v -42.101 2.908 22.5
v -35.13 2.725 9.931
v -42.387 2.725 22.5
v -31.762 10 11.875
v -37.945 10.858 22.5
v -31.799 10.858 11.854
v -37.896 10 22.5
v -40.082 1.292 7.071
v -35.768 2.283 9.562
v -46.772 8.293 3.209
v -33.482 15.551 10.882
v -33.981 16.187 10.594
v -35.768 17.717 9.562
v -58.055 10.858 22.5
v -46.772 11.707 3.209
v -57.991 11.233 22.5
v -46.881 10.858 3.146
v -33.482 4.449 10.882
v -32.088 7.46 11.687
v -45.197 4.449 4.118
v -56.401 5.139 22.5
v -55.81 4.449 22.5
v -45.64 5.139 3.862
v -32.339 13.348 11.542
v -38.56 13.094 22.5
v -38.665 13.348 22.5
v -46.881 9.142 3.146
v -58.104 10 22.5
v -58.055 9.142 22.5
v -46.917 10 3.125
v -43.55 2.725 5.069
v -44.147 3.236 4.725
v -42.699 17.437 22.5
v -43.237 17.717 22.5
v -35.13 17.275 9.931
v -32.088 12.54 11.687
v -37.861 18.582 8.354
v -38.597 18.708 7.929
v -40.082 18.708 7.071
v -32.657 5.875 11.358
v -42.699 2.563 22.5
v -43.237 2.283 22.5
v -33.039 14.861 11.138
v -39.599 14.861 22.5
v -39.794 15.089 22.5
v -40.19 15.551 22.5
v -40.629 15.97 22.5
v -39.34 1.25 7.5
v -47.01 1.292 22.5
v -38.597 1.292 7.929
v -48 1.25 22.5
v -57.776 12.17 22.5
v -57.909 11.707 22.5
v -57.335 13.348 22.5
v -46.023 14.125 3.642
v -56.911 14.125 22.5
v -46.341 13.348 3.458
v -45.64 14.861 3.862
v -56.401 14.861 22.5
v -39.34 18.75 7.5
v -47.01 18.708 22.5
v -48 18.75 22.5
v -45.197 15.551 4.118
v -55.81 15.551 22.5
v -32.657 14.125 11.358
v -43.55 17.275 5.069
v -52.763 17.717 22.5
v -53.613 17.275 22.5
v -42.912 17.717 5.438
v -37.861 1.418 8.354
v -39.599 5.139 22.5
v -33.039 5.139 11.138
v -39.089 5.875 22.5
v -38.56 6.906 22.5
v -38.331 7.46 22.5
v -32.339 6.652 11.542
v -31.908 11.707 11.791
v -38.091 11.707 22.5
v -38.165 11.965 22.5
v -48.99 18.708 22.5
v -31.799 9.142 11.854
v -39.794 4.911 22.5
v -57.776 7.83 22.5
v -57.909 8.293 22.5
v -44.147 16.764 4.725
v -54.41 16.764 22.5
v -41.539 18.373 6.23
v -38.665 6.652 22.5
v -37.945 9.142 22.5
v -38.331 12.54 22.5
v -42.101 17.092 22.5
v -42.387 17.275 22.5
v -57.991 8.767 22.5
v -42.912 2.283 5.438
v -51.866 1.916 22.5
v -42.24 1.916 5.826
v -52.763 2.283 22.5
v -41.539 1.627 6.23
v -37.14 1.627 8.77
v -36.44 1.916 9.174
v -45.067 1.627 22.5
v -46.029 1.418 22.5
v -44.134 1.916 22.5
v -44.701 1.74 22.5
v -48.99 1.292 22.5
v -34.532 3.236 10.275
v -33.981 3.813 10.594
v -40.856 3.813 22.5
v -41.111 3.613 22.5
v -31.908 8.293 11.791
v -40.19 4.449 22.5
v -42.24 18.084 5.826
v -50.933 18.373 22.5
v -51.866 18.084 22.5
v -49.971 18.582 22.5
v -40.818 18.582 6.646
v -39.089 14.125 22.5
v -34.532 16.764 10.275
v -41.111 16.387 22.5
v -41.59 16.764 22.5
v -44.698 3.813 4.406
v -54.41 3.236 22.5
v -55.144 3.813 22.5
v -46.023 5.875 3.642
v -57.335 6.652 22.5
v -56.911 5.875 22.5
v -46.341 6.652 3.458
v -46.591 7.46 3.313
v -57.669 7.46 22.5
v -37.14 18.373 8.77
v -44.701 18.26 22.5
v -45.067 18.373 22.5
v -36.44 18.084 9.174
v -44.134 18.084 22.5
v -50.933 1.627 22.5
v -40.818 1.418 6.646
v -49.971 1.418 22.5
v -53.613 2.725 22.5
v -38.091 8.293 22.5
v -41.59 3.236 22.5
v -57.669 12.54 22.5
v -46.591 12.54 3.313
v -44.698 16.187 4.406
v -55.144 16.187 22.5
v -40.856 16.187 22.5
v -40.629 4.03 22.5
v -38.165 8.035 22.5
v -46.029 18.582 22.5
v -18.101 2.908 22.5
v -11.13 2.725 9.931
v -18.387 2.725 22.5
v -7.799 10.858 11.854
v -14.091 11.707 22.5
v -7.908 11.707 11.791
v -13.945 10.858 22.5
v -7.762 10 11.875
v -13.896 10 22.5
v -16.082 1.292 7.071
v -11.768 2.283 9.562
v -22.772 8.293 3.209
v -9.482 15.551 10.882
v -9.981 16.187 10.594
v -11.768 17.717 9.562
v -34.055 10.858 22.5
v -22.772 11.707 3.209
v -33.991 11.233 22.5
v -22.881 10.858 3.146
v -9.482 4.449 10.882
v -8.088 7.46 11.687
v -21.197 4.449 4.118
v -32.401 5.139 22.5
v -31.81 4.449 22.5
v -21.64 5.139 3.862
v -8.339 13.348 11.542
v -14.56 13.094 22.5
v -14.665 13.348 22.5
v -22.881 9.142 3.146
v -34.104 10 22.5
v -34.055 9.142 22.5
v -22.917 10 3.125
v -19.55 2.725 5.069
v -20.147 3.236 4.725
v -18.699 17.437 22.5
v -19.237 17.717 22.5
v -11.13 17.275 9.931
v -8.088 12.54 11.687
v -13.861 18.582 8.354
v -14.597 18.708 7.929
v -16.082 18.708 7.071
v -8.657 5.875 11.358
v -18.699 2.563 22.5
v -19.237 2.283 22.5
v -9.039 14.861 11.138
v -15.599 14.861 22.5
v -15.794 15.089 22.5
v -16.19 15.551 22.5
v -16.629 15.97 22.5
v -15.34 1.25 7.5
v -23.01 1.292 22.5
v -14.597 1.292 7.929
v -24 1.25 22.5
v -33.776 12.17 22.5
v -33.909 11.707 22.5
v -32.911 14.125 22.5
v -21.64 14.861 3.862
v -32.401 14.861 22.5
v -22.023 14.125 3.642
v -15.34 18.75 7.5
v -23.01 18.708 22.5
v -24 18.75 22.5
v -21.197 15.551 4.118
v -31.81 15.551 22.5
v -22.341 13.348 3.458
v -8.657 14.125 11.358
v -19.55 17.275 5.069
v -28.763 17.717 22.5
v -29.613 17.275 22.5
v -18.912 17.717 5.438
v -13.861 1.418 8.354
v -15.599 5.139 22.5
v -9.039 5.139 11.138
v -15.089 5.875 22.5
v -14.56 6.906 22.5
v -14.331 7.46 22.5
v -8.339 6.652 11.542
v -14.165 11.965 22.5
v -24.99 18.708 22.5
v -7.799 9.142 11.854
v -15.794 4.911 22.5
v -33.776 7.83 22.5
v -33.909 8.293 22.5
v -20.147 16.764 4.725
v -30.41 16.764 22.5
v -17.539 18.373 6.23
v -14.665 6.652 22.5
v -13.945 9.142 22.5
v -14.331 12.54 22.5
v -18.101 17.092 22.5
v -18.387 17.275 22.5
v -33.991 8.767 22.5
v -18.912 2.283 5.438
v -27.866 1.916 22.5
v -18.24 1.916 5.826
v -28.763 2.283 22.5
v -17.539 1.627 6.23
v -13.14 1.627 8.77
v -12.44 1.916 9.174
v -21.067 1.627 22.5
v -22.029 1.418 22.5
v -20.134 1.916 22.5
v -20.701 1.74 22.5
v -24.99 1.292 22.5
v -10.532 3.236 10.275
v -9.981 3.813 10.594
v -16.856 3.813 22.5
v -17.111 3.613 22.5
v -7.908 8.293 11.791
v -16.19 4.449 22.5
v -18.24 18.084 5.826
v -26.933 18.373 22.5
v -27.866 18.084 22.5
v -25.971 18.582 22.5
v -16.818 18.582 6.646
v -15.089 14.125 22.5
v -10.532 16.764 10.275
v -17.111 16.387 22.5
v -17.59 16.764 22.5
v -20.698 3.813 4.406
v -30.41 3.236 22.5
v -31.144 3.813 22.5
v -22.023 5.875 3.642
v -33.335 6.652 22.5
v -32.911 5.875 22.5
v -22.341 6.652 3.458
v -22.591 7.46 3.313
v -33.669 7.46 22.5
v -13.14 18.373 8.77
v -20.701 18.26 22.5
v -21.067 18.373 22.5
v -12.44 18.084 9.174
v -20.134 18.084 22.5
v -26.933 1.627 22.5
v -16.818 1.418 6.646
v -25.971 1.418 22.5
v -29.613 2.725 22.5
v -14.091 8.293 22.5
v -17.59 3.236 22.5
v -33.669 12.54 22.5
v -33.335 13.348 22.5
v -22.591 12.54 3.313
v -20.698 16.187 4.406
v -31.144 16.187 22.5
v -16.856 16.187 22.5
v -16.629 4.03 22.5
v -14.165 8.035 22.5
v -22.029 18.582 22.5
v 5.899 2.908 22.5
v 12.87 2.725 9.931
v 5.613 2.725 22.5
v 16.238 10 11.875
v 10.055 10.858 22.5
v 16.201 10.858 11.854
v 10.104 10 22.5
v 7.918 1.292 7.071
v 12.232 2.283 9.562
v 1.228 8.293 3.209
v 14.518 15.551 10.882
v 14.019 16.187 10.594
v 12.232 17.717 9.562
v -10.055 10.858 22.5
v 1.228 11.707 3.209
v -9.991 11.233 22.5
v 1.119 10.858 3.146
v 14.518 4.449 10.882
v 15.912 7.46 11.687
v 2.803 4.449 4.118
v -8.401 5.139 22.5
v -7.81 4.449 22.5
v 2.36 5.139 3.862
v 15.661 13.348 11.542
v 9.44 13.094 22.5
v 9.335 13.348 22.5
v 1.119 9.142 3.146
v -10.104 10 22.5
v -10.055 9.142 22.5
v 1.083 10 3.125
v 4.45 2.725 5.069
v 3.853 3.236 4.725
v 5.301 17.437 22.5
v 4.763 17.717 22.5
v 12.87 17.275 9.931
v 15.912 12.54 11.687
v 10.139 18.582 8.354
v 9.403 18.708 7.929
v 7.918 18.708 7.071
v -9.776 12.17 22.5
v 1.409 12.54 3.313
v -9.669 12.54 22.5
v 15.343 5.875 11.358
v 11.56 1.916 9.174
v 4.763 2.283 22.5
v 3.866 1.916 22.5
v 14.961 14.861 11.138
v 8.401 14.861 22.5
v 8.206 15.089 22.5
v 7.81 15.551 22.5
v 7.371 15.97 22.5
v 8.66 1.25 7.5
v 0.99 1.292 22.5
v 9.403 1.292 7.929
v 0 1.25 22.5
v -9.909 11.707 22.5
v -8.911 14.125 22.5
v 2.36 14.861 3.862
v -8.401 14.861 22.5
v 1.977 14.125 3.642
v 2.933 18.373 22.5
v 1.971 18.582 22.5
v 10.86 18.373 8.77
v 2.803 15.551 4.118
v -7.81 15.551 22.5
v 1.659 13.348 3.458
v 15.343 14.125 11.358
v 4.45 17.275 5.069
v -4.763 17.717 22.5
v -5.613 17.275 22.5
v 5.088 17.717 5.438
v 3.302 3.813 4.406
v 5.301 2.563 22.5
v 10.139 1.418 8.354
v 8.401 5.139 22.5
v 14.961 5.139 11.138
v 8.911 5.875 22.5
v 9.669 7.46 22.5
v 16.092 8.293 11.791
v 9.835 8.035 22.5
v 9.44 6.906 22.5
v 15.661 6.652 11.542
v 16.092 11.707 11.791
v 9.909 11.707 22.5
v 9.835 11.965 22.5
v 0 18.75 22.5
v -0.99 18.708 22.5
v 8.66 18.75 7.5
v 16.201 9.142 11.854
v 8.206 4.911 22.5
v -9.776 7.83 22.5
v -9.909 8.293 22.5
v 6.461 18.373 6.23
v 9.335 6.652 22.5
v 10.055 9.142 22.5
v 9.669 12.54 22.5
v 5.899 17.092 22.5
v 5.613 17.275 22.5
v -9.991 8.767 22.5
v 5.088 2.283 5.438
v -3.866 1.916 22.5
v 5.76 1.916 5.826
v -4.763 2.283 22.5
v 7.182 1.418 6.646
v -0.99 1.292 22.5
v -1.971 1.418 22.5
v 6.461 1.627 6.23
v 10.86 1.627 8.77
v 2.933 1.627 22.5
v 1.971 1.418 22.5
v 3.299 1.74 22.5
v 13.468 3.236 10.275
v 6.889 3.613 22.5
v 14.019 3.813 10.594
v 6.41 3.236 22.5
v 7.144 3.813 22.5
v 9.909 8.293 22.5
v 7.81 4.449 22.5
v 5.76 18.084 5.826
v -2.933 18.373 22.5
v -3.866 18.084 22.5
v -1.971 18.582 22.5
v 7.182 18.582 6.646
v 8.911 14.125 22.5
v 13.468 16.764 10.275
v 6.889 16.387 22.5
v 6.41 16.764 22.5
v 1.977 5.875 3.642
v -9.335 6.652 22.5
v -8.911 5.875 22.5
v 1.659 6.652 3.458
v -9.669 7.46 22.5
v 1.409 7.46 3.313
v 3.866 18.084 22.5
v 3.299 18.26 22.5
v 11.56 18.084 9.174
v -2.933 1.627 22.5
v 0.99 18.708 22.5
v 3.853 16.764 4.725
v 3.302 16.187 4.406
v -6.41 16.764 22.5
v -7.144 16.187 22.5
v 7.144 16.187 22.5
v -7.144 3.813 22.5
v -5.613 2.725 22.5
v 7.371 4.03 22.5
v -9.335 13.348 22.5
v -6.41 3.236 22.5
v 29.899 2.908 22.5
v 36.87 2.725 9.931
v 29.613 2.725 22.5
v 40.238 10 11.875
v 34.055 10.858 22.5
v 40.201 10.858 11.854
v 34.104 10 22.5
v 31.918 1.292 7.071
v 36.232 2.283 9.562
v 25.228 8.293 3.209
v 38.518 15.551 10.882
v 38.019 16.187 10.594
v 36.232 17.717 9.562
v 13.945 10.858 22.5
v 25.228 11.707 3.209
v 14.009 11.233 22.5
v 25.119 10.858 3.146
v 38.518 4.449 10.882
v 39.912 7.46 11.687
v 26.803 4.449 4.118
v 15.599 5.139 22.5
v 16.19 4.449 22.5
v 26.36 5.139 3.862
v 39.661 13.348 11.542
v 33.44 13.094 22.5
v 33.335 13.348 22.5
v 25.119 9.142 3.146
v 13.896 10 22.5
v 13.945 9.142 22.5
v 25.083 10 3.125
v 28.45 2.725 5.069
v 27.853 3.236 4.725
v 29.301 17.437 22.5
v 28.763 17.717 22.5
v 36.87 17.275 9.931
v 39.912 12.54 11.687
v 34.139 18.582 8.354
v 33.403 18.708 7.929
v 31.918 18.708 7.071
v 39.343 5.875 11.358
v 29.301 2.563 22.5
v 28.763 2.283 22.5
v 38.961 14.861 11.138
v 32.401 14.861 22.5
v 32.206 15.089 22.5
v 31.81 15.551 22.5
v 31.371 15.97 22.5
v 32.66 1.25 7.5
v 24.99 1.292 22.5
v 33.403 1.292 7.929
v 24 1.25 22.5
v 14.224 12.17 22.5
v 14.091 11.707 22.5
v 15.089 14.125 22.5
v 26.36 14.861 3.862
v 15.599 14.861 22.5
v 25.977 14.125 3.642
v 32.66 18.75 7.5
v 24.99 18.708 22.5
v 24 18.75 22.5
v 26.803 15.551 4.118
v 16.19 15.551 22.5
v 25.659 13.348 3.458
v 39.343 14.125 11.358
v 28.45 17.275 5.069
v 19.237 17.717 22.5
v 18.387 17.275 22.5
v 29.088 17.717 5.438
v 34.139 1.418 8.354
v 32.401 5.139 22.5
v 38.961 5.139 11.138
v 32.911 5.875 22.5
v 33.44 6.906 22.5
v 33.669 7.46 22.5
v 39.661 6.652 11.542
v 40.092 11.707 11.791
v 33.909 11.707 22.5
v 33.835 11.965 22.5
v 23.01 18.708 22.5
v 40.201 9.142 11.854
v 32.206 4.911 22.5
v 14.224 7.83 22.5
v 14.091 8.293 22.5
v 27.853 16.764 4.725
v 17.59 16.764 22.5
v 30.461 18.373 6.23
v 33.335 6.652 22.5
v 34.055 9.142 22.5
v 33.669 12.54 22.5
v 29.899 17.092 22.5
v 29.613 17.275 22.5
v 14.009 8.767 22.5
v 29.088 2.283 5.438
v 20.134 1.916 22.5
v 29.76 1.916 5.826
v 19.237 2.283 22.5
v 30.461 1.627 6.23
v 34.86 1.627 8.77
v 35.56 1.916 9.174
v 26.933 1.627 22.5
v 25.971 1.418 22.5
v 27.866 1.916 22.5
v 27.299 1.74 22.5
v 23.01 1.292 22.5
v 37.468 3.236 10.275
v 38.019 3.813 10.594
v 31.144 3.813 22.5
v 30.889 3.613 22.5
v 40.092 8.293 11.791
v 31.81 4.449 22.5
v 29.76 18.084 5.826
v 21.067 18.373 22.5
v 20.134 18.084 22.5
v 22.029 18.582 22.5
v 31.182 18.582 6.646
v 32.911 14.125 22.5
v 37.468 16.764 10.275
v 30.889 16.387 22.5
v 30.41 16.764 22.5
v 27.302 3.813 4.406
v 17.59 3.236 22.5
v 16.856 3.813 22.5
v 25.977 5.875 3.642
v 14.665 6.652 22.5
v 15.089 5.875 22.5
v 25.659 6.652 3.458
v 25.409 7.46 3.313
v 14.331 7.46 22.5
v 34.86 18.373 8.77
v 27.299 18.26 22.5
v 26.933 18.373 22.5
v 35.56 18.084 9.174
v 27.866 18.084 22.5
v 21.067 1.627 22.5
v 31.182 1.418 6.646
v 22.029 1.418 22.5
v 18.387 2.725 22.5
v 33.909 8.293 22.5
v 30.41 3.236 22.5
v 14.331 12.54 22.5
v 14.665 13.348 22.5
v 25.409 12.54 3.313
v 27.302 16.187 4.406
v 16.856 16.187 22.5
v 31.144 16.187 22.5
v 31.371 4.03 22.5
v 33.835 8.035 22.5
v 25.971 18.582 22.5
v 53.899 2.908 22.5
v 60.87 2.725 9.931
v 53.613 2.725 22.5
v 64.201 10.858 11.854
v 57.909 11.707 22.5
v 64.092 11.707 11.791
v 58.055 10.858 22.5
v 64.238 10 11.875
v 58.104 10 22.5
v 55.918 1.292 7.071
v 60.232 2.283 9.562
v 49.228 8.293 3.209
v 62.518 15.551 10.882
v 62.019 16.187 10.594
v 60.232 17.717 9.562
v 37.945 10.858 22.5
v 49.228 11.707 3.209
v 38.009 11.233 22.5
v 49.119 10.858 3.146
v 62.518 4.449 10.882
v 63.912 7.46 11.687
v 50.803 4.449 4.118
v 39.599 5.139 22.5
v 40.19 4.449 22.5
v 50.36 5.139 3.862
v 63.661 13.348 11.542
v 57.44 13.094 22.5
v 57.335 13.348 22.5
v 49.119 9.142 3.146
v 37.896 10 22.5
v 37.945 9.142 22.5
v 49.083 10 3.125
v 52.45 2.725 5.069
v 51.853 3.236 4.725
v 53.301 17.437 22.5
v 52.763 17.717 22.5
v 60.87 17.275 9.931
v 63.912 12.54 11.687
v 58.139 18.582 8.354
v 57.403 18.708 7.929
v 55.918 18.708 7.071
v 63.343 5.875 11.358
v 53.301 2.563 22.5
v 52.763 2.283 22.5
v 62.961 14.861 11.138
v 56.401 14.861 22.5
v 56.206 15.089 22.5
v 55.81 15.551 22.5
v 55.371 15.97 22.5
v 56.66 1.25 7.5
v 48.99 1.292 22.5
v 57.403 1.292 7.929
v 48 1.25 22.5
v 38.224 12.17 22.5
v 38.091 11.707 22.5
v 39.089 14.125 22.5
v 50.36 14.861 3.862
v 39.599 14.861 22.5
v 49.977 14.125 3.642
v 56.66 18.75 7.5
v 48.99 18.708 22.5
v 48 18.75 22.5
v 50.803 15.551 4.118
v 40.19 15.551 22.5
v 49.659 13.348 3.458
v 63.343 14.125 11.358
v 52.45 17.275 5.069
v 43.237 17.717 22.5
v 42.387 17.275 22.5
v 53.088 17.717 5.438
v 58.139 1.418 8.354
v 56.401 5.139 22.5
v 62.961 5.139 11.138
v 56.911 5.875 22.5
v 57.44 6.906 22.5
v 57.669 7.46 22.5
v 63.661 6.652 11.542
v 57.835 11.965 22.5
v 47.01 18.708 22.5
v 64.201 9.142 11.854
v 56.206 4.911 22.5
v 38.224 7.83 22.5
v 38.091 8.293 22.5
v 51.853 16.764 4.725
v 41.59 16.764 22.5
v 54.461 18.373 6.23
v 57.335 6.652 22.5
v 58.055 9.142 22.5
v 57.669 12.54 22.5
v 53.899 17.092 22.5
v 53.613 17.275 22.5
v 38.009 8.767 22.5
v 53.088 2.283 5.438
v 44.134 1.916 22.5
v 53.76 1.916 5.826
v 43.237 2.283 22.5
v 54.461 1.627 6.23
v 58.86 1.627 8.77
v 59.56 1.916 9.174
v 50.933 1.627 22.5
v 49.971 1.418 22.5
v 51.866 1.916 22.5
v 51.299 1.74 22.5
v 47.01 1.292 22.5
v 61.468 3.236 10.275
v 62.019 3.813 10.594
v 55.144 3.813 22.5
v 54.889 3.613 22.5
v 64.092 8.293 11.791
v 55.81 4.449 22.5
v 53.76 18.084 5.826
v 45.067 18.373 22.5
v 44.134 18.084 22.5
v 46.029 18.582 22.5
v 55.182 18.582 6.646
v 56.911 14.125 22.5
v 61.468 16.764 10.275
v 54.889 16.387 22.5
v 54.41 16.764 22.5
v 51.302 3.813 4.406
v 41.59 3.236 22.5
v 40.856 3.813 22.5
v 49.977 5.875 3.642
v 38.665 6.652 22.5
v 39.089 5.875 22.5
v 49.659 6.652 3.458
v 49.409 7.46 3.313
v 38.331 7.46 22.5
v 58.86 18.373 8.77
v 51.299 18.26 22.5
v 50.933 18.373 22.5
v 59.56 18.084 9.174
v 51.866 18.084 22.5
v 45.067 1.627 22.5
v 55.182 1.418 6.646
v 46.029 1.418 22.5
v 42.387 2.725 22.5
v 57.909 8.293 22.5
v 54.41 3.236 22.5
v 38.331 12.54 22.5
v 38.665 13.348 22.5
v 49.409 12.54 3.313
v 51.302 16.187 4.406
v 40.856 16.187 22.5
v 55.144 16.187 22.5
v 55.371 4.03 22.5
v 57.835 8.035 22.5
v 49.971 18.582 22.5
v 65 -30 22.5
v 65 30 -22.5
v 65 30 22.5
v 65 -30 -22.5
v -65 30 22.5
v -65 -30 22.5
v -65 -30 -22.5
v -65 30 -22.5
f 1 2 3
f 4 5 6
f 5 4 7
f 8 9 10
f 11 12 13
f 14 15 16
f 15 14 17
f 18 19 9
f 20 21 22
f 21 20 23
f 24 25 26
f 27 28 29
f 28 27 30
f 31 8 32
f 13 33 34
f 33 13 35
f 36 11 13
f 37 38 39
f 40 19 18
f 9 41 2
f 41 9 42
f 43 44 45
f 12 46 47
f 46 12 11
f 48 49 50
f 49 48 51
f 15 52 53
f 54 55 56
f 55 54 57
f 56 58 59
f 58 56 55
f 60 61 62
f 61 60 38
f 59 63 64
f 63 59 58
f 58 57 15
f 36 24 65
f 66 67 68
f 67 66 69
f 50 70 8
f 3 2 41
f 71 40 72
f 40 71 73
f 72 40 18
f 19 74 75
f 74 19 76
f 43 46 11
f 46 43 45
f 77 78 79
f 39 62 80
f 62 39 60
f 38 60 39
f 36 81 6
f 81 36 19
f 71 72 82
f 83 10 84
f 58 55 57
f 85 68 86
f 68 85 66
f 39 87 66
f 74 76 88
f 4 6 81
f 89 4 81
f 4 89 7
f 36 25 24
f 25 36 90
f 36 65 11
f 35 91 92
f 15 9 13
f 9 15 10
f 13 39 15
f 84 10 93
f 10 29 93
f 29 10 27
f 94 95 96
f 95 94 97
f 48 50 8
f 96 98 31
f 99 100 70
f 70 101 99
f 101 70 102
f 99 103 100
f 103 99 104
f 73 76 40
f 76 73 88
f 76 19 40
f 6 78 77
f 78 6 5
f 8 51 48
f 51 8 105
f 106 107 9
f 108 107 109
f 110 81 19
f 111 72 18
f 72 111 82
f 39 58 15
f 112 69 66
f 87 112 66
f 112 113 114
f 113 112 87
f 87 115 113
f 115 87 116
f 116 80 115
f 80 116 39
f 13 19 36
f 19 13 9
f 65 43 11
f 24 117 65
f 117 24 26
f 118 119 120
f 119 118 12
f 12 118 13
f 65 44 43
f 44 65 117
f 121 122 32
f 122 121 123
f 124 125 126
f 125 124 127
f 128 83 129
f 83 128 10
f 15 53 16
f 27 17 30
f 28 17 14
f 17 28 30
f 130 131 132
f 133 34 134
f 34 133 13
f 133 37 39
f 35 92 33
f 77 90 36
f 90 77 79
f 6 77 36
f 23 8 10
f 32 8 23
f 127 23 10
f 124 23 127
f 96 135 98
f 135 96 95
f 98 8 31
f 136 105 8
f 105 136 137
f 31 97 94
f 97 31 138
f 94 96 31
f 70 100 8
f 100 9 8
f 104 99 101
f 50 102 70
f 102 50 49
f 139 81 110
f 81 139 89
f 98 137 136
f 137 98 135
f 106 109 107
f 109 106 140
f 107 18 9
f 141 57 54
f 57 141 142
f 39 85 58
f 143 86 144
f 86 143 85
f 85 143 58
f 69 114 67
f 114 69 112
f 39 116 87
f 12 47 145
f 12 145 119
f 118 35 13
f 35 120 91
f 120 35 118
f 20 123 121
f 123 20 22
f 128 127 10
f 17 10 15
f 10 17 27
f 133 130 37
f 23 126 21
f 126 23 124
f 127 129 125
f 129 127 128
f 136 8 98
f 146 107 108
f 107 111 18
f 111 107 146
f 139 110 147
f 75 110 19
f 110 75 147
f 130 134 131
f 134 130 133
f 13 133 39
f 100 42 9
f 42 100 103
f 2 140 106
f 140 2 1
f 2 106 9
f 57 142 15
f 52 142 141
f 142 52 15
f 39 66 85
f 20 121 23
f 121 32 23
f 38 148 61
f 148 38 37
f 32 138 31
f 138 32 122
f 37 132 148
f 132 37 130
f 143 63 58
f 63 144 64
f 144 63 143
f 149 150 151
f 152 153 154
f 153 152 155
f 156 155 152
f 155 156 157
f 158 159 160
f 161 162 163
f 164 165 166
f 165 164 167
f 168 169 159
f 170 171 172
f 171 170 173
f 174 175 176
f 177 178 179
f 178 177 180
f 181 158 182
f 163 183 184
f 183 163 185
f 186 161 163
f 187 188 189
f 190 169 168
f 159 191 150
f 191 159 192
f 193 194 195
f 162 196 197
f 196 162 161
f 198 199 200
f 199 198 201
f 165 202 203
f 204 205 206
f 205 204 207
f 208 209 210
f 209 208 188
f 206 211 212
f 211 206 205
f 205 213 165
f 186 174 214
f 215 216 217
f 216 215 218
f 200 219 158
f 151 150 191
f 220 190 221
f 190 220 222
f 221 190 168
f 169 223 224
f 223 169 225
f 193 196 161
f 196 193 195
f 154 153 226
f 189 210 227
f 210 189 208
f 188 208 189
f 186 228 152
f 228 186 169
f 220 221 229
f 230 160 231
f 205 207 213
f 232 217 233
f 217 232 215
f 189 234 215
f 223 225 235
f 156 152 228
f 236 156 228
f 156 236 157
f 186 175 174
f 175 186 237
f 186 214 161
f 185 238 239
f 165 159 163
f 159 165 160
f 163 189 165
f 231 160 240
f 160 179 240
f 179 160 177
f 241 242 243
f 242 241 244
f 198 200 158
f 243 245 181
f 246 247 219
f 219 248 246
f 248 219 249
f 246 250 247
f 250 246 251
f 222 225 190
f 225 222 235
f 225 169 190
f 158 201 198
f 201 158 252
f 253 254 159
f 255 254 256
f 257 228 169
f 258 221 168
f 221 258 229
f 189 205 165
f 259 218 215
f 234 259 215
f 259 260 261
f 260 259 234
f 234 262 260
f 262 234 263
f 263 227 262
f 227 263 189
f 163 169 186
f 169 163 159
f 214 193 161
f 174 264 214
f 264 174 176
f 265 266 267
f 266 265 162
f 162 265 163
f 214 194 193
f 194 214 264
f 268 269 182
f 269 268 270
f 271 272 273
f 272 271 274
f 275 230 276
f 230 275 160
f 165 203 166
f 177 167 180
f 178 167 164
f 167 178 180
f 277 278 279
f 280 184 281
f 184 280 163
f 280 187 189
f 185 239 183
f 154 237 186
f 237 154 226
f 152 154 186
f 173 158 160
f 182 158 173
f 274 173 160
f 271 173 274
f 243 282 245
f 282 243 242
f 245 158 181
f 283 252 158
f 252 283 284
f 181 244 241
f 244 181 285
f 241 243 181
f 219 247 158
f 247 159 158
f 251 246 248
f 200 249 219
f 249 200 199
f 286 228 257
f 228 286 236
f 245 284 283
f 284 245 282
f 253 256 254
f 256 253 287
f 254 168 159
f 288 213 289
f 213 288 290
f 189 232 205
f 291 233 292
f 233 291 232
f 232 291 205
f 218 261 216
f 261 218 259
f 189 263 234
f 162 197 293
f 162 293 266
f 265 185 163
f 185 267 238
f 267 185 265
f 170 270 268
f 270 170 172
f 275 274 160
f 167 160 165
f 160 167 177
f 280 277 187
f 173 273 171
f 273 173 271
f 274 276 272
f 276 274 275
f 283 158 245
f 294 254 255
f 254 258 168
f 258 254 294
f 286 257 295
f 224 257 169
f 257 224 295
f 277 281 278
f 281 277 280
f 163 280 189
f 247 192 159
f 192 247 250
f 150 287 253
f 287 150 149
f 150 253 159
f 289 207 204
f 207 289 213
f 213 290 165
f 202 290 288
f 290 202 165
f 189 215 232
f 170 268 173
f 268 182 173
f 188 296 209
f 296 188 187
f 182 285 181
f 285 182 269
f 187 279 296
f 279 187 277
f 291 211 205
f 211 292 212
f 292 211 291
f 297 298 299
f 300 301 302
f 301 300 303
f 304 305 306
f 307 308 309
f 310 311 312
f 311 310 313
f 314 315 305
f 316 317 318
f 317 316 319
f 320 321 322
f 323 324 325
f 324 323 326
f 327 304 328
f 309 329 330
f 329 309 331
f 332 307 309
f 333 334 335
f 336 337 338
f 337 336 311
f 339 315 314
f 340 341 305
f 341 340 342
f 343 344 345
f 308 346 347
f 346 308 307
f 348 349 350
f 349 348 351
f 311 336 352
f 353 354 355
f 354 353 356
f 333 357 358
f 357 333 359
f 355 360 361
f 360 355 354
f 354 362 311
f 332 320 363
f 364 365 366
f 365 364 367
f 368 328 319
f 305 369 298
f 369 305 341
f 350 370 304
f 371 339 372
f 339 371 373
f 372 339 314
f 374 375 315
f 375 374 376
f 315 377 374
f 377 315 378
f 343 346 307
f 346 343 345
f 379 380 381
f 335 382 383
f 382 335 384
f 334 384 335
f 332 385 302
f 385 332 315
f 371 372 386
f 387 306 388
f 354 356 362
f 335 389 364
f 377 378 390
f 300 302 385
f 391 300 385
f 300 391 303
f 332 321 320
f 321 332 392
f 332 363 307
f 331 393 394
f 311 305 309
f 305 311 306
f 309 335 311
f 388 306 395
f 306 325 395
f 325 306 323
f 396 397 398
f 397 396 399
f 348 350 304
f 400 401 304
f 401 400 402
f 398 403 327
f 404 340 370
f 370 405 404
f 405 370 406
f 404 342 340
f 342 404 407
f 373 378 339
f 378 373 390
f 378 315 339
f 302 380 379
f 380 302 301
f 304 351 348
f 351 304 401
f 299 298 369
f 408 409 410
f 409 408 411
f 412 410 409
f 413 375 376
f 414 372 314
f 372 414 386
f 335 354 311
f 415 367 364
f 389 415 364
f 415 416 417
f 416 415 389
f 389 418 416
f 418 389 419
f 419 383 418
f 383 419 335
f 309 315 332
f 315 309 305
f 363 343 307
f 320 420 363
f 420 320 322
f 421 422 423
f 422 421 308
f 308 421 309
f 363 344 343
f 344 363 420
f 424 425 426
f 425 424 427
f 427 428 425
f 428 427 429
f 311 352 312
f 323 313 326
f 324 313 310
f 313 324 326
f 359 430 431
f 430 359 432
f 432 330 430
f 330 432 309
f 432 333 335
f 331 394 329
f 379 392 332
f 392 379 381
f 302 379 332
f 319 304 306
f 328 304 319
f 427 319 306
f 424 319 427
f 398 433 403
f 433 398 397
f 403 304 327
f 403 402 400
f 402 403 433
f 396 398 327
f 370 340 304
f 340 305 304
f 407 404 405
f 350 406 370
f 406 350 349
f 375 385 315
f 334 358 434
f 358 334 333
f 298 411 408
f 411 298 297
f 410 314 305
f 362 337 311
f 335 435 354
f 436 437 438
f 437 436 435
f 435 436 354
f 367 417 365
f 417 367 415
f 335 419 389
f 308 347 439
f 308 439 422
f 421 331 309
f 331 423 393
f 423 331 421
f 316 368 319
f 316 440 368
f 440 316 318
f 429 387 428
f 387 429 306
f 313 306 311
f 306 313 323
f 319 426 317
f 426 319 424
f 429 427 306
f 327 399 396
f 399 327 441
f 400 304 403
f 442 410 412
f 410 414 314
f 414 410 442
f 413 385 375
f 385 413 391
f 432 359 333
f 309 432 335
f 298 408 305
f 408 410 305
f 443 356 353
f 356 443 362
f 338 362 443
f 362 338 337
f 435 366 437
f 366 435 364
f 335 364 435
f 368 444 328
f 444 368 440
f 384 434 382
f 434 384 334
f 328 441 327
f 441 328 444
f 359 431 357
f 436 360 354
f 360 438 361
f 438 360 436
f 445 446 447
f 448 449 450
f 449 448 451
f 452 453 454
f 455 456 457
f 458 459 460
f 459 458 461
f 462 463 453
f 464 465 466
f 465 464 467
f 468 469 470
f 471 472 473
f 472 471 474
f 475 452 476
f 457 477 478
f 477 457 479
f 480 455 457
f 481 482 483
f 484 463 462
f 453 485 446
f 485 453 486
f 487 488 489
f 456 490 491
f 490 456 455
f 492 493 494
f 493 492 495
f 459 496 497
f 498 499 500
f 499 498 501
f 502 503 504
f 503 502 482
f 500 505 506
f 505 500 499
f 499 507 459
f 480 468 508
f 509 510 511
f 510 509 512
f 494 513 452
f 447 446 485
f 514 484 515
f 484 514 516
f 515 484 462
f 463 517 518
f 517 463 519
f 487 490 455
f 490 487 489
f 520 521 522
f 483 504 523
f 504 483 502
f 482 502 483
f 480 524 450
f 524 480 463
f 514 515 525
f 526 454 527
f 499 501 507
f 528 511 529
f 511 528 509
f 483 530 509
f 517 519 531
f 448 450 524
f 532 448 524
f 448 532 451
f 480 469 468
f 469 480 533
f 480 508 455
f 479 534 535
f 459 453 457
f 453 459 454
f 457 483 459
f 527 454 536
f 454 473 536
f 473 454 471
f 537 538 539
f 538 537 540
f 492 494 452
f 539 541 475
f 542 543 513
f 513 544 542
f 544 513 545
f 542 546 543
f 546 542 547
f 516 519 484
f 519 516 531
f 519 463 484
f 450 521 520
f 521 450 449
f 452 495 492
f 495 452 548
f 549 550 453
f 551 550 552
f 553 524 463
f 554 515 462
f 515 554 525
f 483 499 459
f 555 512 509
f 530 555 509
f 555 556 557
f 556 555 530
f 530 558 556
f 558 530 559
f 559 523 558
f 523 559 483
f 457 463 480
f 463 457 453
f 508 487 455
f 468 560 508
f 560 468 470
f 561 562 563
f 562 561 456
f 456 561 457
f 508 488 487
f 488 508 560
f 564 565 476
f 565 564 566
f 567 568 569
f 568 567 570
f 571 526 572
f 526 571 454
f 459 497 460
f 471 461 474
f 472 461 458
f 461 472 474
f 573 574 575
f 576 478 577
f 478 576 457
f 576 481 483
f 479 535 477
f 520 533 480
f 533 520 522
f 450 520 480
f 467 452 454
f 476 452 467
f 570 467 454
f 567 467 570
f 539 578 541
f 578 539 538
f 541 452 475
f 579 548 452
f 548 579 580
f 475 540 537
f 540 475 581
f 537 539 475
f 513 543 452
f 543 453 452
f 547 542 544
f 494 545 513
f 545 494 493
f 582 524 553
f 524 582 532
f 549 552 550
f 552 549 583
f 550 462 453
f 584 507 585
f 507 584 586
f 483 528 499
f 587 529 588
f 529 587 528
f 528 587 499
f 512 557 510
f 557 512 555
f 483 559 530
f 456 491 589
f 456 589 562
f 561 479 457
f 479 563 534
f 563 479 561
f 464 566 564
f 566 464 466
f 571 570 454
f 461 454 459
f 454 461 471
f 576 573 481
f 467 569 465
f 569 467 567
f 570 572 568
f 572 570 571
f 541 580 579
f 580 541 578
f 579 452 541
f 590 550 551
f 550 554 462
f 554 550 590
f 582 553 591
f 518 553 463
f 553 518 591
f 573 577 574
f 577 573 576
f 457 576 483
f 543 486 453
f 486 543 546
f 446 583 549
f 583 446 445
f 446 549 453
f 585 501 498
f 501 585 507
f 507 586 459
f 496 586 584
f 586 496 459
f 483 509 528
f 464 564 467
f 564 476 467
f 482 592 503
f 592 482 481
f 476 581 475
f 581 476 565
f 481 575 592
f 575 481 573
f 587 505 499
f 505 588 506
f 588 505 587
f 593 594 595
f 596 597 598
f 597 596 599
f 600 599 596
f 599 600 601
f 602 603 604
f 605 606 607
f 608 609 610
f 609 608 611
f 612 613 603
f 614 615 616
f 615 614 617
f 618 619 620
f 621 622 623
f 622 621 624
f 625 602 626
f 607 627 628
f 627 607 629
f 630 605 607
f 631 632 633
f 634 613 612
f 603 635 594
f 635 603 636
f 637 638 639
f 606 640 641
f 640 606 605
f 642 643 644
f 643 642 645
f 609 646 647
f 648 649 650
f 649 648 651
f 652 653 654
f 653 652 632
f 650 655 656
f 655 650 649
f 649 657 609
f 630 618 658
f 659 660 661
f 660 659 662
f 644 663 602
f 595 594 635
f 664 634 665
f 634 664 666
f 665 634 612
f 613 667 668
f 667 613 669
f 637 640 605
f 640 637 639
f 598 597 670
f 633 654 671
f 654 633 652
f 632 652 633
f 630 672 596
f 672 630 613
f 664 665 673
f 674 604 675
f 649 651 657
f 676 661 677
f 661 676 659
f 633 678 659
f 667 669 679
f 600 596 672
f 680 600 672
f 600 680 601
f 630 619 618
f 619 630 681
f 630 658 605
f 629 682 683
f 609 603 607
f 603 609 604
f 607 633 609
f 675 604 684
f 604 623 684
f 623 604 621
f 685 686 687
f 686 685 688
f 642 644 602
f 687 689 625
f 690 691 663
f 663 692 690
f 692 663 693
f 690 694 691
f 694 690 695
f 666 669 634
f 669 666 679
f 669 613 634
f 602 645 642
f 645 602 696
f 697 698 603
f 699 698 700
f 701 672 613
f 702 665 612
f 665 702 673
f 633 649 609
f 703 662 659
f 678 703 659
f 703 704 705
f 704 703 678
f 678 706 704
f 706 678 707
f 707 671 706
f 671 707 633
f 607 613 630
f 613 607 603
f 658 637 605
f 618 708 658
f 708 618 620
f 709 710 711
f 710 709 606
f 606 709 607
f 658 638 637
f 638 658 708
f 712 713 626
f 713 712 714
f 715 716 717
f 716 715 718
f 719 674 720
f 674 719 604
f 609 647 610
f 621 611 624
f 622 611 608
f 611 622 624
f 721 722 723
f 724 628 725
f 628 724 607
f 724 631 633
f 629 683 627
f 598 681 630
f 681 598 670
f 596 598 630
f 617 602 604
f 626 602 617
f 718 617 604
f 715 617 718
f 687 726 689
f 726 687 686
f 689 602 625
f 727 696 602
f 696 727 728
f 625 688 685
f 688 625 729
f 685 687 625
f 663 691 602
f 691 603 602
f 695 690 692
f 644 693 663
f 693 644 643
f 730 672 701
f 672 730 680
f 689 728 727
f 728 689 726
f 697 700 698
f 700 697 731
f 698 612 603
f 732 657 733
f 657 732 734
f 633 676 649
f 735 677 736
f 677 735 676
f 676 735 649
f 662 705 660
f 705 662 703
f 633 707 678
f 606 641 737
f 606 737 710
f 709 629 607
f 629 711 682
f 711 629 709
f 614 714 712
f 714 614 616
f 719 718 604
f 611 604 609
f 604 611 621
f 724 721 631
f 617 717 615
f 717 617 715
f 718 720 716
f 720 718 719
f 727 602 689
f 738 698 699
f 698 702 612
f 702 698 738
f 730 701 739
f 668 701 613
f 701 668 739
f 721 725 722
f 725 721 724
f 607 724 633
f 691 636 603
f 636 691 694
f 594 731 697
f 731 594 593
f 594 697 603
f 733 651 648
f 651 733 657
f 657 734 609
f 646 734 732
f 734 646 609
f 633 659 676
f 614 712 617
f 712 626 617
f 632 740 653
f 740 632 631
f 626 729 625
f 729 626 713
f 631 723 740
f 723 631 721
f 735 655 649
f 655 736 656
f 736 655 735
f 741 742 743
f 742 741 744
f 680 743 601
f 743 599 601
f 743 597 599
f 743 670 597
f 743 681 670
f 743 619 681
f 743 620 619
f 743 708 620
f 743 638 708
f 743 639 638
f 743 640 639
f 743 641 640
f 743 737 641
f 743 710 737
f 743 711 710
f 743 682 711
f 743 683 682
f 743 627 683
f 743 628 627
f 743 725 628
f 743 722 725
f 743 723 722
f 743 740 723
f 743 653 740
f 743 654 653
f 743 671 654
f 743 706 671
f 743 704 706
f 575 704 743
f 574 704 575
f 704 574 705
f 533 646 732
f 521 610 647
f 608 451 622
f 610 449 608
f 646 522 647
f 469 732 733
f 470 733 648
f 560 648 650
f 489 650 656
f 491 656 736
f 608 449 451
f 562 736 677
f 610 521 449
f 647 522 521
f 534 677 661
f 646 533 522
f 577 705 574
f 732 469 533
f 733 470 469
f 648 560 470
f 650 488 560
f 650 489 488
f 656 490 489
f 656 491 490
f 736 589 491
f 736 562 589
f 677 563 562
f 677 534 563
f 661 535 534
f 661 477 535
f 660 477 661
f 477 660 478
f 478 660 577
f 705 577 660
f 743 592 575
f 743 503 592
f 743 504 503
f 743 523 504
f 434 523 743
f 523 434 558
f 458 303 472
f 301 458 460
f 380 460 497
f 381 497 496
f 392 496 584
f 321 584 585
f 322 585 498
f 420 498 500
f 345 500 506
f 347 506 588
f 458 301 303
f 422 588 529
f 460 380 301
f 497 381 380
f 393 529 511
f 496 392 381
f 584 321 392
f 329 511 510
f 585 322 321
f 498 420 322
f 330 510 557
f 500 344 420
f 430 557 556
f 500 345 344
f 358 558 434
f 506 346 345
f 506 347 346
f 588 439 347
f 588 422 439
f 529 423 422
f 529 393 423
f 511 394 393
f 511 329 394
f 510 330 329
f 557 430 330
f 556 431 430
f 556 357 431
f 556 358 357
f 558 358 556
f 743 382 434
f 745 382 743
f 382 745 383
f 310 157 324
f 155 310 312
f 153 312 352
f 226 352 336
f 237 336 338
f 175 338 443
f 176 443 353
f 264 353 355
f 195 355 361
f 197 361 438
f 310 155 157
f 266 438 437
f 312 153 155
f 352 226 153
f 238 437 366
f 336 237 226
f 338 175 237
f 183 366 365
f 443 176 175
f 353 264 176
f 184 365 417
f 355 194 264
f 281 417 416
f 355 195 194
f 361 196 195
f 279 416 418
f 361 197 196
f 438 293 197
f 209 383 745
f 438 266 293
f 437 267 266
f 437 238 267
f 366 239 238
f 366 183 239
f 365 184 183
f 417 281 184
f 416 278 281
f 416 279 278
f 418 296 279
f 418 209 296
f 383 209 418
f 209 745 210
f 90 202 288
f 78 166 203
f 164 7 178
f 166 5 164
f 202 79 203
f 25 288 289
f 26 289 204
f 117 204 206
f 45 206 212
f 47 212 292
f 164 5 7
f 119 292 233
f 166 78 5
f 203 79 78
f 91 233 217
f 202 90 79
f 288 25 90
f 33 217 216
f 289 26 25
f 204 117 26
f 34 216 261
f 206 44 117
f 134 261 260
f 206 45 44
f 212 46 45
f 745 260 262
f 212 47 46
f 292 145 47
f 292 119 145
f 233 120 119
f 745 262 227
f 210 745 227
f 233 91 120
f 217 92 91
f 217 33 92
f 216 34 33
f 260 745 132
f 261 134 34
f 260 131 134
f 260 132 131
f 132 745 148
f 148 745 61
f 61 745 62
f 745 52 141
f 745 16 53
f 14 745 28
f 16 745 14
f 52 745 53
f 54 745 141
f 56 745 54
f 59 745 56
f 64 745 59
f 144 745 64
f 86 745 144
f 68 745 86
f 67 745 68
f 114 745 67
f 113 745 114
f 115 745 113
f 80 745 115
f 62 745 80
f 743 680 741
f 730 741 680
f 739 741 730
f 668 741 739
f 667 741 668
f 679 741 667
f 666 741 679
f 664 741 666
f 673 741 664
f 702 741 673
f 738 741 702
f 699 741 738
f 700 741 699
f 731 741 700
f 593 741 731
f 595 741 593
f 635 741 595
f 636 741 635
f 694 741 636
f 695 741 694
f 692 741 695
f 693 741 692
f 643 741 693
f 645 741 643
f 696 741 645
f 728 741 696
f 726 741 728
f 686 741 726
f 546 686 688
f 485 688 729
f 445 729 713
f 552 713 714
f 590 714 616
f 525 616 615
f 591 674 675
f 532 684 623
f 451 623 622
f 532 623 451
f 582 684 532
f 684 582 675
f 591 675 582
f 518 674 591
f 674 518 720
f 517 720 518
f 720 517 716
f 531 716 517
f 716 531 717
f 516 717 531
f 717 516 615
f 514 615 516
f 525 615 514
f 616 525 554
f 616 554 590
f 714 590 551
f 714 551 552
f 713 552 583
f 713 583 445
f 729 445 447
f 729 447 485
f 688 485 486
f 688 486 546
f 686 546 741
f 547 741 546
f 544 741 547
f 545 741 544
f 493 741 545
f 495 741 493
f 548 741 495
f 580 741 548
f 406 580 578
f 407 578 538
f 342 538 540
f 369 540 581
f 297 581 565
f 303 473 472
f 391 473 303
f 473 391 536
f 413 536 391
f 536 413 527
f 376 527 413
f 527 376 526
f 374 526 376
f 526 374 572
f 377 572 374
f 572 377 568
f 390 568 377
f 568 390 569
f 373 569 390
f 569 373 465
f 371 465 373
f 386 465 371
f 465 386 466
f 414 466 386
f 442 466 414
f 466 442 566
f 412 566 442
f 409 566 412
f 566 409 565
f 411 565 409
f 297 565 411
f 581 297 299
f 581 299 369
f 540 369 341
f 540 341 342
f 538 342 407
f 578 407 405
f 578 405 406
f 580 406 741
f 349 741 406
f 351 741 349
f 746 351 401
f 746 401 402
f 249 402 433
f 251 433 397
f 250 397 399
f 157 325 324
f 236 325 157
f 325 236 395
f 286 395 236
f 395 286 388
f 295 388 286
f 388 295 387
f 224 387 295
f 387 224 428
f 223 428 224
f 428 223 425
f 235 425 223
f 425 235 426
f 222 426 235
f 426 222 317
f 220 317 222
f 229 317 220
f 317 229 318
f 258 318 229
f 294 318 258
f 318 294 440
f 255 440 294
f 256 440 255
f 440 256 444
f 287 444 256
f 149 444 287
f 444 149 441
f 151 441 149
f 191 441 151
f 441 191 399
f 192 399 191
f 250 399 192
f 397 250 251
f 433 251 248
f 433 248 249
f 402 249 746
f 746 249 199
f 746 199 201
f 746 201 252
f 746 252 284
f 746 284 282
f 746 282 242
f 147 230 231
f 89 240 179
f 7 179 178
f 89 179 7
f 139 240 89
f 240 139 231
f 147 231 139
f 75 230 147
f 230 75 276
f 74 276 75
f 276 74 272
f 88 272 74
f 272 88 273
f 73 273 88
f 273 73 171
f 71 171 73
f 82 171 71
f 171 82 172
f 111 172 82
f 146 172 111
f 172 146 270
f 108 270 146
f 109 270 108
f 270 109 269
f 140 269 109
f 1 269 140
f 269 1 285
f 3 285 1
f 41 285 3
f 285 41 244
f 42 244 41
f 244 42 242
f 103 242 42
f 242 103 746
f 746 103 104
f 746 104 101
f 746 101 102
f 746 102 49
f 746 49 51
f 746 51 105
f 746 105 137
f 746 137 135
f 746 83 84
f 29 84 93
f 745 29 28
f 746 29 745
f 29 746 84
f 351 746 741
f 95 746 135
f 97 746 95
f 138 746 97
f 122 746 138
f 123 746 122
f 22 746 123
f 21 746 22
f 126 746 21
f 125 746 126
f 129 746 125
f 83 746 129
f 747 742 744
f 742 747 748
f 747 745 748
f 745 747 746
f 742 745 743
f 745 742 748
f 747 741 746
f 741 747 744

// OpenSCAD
// --- Dimensions ---
rack_length = 130;    // Total length along X (mm)
rack_depth = 60;      // Total depth along Y (mm)
rack_height = 45;     // Total height along Z (mm)

tube_hole_diameter = 17.5; // Diameter of the tube hole (mm)
tube_hole_radius = tube_hole_diameter / 2;
tube_hole_depth = 40;    // Depth of the cylindrical cut (mm)

num_tubes = 5;         // Number of tubes to hold
spacing_x = 24;        // Distance between centers of holes along X (mm)

tilt_angle = 30;       // Tilt angle in degrees from vertical (YZ plane)

// --- Constants ---
$fn = 64; // High resolution for curves

// --- Base Block Definition ---
module base_block() {
    cube([rack_length, rack_depth, rack_height], center = true);
}

// --- Hole Geometry Calculation ---
// Total span for 5 tubes: (5-1) * spacing_x = 4 * 24 = 96 mm.
// Centered on origin, so start offset is -96/2 = -48 mm from center.
module tube_hole(center_x) {
    // The hole axis starts at Z = rack_height/2 (top face center) and goes down.
    // It is tilted 30 degrees in the YZ plane, moving towards +Y.

    // We use a cylinder centered at its local origin, then translate/rotate it so that its top face aligns with Z=rack_height/2.

    // The distance along the tilted axis from the entry point to the center is tube_hole_depth / 2.
    // When rotated by -tilt_angle around X:
    // Offset vector calculation derived from geometry for correct placement:
    // Entry point P_entry = [center_x, 0, rack_height/2]
    // Center of cylinder required in world coordinates:
    // C_world = P_entry + (tube_hole_depth/2) * [0, sin(tilt_angle), -cos(tilt_angle)]

    translate([center_x, 0, rack_height/2]) {
        rotate([0, -tilt_angle, 0]) {
            // Translate the cylinder so its center is correctly positioned relative to the entry point on Z=rack_height/2.
            // The translation vector moves the local origin (which is at the top face when unrotated) down along the tilted axis by tube_hole_depth / 2.
            translate([0, (tube_hole_depth/2) * sin(tilt_angle), -(tube_hole_depth/2) * cos(tilt_angle)]) {
                cylinder(h = tube_hole_depth, r = tube_hole_radius);
            }
        }
    }
}

// --- Final Assembly ---
difference() {
    // 1. The solid block
    base_block();

    // 2. Subtract the five holes
    union() {
        for (i = [0 : num_tubes - 1]) {
            x_pos = (-((num_tubes - 1) * spacing_x) / 2) + (i * spacing_x);
            tube_hole(center_x = x_pos);
        }
    }
}
